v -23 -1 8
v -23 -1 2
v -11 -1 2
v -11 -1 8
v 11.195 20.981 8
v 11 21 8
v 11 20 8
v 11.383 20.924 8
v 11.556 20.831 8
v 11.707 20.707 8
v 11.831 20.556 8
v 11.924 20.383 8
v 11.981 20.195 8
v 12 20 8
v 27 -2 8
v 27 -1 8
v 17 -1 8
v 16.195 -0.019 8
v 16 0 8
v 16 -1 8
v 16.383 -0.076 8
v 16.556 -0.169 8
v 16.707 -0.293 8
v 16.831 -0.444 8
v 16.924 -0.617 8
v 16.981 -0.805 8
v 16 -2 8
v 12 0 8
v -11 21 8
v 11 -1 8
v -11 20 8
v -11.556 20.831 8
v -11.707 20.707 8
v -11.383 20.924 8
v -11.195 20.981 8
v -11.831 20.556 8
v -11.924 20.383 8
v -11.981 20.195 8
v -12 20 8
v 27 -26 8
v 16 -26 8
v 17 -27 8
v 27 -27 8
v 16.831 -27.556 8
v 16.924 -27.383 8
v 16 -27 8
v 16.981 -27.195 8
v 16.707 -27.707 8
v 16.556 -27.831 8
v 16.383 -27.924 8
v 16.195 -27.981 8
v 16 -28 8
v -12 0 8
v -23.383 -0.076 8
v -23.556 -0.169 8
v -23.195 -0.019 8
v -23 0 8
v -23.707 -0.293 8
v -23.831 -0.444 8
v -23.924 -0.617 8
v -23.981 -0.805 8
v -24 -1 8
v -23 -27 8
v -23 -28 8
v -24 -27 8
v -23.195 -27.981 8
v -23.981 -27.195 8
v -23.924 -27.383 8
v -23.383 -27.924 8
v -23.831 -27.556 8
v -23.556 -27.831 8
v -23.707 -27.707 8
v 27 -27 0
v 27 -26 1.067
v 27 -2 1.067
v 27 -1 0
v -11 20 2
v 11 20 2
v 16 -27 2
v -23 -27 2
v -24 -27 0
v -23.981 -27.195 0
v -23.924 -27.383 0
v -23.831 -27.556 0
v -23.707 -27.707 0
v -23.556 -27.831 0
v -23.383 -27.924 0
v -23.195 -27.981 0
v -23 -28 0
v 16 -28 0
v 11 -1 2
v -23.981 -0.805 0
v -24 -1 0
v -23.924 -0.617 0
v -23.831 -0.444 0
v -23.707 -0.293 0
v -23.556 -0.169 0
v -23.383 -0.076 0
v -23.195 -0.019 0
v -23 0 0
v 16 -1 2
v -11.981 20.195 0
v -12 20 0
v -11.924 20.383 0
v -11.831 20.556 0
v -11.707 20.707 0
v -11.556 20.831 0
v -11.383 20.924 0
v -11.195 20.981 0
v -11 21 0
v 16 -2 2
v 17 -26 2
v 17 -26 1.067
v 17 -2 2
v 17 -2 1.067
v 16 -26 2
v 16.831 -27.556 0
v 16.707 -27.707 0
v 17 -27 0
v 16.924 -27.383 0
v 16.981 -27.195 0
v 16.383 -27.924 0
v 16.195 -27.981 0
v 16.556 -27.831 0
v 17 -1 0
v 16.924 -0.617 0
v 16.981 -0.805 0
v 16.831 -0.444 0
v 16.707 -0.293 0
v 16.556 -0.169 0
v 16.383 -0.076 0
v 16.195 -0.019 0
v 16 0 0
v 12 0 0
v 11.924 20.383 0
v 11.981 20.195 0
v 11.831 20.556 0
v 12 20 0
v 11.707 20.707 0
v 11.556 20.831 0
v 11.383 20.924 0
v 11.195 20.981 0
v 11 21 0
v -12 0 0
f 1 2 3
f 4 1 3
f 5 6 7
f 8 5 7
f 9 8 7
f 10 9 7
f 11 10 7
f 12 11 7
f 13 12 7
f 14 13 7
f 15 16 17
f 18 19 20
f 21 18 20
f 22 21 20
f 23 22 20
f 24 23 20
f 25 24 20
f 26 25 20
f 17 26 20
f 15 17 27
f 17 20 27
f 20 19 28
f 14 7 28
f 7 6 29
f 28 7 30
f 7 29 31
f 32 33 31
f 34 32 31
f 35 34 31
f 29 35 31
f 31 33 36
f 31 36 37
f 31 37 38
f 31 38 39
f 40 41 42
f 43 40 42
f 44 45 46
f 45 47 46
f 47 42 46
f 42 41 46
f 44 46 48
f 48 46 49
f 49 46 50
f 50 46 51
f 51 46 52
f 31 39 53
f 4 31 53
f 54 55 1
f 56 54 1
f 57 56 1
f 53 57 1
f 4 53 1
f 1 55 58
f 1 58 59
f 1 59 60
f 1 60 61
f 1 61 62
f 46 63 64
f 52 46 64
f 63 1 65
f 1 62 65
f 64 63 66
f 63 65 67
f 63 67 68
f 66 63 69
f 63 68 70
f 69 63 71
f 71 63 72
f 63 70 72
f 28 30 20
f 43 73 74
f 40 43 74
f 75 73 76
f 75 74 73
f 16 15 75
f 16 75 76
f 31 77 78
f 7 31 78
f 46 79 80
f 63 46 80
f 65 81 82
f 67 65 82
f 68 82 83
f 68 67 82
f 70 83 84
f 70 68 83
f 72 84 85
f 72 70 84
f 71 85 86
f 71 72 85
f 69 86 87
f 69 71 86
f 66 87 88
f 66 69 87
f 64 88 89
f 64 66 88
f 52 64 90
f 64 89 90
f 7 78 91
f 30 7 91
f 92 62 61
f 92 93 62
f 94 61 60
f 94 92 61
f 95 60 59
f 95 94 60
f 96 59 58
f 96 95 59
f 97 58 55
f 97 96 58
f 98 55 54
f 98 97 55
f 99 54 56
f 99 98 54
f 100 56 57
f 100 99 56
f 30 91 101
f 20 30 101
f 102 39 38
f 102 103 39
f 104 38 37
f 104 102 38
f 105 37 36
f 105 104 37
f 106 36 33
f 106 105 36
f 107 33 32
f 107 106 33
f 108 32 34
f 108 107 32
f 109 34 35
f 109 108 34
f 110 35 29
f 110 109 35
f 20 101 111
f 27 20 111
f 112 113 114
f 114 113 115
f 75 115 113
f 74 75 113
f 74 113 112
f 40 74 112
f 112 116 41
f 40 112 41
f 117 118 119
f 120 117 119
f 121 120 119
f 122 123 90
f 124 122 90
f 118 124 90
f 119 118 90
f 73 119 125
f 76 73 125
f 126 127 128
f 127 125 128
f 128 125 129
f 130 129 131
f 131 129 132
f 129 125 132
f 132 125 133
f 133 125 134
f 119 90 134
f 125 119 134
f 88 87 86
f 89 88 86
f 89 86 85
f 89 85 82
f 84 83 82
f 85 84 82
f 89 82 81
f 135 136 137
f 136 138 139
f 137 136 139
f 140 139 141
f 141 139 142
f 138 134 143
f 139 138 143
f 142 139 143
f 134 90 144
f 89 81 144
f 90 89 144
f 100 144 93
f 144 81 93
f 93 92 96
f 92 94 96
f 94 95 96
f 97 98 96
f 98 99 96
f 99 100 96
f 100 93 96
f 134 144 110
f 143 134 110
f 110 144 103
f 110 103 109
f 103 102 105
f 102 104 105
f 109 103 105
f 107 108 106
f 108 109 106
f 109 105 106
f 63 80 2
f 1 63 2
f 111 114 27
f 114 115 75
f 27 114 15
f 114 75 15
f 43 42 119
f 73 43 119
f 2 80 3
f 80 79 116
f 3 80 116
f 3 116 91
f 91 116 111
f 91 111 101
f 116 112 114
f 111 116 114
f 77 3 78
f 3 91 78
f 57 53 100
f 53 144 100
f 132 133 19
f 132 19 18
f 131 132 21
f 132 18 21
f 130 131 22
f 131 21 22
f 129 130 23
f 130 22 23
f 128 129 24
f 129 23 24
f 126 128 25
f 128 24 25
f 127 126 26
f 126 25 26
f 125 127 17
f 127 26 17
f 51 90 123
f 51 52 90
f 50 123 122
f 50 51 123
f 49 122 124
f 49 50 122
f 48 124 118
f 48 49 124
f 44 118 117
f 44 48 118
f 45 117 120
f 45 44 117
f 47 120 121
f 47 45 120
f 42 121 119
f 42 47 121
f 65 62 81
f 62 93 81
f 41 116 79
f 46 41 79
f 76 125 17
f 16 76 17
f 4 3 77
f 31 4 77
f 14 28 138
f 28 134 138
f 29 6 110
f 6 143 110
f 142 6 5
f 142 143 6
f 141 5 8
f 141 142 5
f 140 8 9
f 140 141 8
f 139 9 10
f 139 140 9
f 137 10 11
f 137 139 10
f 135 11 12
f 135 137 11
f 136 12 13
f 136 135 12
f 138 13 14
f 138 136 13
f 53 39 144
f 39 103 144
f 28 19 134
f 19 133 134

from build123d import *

# Parameters (mm, degrees)
F1_DEPTH = 2
F3_DEPTH = 6
F4_W     = 24
F4_H     = 6
F5_DEPTH = 1
F6_R     = 1
F8_DEPTH = 10


with BuildPart() as f1:
    # F0 (on Top) → F1 (new body)
    with BuildSketch(Plane.XY):
        Polygon((-24, 0), (-24, -28), (17, -28), (17, 0), (12, 0), (12, 21), (-12, 21), (-12, 0), align=None)
    extrude(amount=F1_DEPTH)

    # F2 (on face) → F3 (join)
    with BuildSketch(Plane.XY.offset(2)):
        Polygon((-24, 0), (-24, -28), (17, -28), (17, 0), (12, 0), (12, 21), (-12, 21), (-12, 0), align=None)
        Polygon((-23, -1), (-11, -1), (-11, 20), (11, 20), (11, -1), (16, -1), (16, -27), (-23, -27), align=None, mode=Mode.SUBTRACT)
    extrude(amount=F3_DEPTH)

    # F4 (on face) → F5 (cut, through all)
    with BuildSketch(Plane.YZ.offset(17)):
        with Locations((-14, 5)):
            Rectangle(F4_W, F4_H)
    extrude(amount=-F5_DEPTH, mode=Mode.SUBTRACT)

    # F6
    f6_edges = [f1.edges().sort_by_distance(p)[0] for p in [
        (-24, 0, 4),
        (-12, 21, 4),
        (12, 21, 4),
        (17, 0, 4),
        (17, -28, 4),
        (-24, -28, 4),
    ]]
    fillet(f6_edges, radius=F6_R)

    # F7 (on face) → F8 (join)
    with BuildSketch(Plane.YZ.offset(17)):
        Polygon((-26, 2), (-26, 8), (-27, 8), (-27, 0), (-1, 0), (-1, 8), (-2, 8), (-2, 2), (-2, 1.066827), (-26, 1.066827), align=None)
    extrude(amount=F8_DEPTH)


solid = f1.part
